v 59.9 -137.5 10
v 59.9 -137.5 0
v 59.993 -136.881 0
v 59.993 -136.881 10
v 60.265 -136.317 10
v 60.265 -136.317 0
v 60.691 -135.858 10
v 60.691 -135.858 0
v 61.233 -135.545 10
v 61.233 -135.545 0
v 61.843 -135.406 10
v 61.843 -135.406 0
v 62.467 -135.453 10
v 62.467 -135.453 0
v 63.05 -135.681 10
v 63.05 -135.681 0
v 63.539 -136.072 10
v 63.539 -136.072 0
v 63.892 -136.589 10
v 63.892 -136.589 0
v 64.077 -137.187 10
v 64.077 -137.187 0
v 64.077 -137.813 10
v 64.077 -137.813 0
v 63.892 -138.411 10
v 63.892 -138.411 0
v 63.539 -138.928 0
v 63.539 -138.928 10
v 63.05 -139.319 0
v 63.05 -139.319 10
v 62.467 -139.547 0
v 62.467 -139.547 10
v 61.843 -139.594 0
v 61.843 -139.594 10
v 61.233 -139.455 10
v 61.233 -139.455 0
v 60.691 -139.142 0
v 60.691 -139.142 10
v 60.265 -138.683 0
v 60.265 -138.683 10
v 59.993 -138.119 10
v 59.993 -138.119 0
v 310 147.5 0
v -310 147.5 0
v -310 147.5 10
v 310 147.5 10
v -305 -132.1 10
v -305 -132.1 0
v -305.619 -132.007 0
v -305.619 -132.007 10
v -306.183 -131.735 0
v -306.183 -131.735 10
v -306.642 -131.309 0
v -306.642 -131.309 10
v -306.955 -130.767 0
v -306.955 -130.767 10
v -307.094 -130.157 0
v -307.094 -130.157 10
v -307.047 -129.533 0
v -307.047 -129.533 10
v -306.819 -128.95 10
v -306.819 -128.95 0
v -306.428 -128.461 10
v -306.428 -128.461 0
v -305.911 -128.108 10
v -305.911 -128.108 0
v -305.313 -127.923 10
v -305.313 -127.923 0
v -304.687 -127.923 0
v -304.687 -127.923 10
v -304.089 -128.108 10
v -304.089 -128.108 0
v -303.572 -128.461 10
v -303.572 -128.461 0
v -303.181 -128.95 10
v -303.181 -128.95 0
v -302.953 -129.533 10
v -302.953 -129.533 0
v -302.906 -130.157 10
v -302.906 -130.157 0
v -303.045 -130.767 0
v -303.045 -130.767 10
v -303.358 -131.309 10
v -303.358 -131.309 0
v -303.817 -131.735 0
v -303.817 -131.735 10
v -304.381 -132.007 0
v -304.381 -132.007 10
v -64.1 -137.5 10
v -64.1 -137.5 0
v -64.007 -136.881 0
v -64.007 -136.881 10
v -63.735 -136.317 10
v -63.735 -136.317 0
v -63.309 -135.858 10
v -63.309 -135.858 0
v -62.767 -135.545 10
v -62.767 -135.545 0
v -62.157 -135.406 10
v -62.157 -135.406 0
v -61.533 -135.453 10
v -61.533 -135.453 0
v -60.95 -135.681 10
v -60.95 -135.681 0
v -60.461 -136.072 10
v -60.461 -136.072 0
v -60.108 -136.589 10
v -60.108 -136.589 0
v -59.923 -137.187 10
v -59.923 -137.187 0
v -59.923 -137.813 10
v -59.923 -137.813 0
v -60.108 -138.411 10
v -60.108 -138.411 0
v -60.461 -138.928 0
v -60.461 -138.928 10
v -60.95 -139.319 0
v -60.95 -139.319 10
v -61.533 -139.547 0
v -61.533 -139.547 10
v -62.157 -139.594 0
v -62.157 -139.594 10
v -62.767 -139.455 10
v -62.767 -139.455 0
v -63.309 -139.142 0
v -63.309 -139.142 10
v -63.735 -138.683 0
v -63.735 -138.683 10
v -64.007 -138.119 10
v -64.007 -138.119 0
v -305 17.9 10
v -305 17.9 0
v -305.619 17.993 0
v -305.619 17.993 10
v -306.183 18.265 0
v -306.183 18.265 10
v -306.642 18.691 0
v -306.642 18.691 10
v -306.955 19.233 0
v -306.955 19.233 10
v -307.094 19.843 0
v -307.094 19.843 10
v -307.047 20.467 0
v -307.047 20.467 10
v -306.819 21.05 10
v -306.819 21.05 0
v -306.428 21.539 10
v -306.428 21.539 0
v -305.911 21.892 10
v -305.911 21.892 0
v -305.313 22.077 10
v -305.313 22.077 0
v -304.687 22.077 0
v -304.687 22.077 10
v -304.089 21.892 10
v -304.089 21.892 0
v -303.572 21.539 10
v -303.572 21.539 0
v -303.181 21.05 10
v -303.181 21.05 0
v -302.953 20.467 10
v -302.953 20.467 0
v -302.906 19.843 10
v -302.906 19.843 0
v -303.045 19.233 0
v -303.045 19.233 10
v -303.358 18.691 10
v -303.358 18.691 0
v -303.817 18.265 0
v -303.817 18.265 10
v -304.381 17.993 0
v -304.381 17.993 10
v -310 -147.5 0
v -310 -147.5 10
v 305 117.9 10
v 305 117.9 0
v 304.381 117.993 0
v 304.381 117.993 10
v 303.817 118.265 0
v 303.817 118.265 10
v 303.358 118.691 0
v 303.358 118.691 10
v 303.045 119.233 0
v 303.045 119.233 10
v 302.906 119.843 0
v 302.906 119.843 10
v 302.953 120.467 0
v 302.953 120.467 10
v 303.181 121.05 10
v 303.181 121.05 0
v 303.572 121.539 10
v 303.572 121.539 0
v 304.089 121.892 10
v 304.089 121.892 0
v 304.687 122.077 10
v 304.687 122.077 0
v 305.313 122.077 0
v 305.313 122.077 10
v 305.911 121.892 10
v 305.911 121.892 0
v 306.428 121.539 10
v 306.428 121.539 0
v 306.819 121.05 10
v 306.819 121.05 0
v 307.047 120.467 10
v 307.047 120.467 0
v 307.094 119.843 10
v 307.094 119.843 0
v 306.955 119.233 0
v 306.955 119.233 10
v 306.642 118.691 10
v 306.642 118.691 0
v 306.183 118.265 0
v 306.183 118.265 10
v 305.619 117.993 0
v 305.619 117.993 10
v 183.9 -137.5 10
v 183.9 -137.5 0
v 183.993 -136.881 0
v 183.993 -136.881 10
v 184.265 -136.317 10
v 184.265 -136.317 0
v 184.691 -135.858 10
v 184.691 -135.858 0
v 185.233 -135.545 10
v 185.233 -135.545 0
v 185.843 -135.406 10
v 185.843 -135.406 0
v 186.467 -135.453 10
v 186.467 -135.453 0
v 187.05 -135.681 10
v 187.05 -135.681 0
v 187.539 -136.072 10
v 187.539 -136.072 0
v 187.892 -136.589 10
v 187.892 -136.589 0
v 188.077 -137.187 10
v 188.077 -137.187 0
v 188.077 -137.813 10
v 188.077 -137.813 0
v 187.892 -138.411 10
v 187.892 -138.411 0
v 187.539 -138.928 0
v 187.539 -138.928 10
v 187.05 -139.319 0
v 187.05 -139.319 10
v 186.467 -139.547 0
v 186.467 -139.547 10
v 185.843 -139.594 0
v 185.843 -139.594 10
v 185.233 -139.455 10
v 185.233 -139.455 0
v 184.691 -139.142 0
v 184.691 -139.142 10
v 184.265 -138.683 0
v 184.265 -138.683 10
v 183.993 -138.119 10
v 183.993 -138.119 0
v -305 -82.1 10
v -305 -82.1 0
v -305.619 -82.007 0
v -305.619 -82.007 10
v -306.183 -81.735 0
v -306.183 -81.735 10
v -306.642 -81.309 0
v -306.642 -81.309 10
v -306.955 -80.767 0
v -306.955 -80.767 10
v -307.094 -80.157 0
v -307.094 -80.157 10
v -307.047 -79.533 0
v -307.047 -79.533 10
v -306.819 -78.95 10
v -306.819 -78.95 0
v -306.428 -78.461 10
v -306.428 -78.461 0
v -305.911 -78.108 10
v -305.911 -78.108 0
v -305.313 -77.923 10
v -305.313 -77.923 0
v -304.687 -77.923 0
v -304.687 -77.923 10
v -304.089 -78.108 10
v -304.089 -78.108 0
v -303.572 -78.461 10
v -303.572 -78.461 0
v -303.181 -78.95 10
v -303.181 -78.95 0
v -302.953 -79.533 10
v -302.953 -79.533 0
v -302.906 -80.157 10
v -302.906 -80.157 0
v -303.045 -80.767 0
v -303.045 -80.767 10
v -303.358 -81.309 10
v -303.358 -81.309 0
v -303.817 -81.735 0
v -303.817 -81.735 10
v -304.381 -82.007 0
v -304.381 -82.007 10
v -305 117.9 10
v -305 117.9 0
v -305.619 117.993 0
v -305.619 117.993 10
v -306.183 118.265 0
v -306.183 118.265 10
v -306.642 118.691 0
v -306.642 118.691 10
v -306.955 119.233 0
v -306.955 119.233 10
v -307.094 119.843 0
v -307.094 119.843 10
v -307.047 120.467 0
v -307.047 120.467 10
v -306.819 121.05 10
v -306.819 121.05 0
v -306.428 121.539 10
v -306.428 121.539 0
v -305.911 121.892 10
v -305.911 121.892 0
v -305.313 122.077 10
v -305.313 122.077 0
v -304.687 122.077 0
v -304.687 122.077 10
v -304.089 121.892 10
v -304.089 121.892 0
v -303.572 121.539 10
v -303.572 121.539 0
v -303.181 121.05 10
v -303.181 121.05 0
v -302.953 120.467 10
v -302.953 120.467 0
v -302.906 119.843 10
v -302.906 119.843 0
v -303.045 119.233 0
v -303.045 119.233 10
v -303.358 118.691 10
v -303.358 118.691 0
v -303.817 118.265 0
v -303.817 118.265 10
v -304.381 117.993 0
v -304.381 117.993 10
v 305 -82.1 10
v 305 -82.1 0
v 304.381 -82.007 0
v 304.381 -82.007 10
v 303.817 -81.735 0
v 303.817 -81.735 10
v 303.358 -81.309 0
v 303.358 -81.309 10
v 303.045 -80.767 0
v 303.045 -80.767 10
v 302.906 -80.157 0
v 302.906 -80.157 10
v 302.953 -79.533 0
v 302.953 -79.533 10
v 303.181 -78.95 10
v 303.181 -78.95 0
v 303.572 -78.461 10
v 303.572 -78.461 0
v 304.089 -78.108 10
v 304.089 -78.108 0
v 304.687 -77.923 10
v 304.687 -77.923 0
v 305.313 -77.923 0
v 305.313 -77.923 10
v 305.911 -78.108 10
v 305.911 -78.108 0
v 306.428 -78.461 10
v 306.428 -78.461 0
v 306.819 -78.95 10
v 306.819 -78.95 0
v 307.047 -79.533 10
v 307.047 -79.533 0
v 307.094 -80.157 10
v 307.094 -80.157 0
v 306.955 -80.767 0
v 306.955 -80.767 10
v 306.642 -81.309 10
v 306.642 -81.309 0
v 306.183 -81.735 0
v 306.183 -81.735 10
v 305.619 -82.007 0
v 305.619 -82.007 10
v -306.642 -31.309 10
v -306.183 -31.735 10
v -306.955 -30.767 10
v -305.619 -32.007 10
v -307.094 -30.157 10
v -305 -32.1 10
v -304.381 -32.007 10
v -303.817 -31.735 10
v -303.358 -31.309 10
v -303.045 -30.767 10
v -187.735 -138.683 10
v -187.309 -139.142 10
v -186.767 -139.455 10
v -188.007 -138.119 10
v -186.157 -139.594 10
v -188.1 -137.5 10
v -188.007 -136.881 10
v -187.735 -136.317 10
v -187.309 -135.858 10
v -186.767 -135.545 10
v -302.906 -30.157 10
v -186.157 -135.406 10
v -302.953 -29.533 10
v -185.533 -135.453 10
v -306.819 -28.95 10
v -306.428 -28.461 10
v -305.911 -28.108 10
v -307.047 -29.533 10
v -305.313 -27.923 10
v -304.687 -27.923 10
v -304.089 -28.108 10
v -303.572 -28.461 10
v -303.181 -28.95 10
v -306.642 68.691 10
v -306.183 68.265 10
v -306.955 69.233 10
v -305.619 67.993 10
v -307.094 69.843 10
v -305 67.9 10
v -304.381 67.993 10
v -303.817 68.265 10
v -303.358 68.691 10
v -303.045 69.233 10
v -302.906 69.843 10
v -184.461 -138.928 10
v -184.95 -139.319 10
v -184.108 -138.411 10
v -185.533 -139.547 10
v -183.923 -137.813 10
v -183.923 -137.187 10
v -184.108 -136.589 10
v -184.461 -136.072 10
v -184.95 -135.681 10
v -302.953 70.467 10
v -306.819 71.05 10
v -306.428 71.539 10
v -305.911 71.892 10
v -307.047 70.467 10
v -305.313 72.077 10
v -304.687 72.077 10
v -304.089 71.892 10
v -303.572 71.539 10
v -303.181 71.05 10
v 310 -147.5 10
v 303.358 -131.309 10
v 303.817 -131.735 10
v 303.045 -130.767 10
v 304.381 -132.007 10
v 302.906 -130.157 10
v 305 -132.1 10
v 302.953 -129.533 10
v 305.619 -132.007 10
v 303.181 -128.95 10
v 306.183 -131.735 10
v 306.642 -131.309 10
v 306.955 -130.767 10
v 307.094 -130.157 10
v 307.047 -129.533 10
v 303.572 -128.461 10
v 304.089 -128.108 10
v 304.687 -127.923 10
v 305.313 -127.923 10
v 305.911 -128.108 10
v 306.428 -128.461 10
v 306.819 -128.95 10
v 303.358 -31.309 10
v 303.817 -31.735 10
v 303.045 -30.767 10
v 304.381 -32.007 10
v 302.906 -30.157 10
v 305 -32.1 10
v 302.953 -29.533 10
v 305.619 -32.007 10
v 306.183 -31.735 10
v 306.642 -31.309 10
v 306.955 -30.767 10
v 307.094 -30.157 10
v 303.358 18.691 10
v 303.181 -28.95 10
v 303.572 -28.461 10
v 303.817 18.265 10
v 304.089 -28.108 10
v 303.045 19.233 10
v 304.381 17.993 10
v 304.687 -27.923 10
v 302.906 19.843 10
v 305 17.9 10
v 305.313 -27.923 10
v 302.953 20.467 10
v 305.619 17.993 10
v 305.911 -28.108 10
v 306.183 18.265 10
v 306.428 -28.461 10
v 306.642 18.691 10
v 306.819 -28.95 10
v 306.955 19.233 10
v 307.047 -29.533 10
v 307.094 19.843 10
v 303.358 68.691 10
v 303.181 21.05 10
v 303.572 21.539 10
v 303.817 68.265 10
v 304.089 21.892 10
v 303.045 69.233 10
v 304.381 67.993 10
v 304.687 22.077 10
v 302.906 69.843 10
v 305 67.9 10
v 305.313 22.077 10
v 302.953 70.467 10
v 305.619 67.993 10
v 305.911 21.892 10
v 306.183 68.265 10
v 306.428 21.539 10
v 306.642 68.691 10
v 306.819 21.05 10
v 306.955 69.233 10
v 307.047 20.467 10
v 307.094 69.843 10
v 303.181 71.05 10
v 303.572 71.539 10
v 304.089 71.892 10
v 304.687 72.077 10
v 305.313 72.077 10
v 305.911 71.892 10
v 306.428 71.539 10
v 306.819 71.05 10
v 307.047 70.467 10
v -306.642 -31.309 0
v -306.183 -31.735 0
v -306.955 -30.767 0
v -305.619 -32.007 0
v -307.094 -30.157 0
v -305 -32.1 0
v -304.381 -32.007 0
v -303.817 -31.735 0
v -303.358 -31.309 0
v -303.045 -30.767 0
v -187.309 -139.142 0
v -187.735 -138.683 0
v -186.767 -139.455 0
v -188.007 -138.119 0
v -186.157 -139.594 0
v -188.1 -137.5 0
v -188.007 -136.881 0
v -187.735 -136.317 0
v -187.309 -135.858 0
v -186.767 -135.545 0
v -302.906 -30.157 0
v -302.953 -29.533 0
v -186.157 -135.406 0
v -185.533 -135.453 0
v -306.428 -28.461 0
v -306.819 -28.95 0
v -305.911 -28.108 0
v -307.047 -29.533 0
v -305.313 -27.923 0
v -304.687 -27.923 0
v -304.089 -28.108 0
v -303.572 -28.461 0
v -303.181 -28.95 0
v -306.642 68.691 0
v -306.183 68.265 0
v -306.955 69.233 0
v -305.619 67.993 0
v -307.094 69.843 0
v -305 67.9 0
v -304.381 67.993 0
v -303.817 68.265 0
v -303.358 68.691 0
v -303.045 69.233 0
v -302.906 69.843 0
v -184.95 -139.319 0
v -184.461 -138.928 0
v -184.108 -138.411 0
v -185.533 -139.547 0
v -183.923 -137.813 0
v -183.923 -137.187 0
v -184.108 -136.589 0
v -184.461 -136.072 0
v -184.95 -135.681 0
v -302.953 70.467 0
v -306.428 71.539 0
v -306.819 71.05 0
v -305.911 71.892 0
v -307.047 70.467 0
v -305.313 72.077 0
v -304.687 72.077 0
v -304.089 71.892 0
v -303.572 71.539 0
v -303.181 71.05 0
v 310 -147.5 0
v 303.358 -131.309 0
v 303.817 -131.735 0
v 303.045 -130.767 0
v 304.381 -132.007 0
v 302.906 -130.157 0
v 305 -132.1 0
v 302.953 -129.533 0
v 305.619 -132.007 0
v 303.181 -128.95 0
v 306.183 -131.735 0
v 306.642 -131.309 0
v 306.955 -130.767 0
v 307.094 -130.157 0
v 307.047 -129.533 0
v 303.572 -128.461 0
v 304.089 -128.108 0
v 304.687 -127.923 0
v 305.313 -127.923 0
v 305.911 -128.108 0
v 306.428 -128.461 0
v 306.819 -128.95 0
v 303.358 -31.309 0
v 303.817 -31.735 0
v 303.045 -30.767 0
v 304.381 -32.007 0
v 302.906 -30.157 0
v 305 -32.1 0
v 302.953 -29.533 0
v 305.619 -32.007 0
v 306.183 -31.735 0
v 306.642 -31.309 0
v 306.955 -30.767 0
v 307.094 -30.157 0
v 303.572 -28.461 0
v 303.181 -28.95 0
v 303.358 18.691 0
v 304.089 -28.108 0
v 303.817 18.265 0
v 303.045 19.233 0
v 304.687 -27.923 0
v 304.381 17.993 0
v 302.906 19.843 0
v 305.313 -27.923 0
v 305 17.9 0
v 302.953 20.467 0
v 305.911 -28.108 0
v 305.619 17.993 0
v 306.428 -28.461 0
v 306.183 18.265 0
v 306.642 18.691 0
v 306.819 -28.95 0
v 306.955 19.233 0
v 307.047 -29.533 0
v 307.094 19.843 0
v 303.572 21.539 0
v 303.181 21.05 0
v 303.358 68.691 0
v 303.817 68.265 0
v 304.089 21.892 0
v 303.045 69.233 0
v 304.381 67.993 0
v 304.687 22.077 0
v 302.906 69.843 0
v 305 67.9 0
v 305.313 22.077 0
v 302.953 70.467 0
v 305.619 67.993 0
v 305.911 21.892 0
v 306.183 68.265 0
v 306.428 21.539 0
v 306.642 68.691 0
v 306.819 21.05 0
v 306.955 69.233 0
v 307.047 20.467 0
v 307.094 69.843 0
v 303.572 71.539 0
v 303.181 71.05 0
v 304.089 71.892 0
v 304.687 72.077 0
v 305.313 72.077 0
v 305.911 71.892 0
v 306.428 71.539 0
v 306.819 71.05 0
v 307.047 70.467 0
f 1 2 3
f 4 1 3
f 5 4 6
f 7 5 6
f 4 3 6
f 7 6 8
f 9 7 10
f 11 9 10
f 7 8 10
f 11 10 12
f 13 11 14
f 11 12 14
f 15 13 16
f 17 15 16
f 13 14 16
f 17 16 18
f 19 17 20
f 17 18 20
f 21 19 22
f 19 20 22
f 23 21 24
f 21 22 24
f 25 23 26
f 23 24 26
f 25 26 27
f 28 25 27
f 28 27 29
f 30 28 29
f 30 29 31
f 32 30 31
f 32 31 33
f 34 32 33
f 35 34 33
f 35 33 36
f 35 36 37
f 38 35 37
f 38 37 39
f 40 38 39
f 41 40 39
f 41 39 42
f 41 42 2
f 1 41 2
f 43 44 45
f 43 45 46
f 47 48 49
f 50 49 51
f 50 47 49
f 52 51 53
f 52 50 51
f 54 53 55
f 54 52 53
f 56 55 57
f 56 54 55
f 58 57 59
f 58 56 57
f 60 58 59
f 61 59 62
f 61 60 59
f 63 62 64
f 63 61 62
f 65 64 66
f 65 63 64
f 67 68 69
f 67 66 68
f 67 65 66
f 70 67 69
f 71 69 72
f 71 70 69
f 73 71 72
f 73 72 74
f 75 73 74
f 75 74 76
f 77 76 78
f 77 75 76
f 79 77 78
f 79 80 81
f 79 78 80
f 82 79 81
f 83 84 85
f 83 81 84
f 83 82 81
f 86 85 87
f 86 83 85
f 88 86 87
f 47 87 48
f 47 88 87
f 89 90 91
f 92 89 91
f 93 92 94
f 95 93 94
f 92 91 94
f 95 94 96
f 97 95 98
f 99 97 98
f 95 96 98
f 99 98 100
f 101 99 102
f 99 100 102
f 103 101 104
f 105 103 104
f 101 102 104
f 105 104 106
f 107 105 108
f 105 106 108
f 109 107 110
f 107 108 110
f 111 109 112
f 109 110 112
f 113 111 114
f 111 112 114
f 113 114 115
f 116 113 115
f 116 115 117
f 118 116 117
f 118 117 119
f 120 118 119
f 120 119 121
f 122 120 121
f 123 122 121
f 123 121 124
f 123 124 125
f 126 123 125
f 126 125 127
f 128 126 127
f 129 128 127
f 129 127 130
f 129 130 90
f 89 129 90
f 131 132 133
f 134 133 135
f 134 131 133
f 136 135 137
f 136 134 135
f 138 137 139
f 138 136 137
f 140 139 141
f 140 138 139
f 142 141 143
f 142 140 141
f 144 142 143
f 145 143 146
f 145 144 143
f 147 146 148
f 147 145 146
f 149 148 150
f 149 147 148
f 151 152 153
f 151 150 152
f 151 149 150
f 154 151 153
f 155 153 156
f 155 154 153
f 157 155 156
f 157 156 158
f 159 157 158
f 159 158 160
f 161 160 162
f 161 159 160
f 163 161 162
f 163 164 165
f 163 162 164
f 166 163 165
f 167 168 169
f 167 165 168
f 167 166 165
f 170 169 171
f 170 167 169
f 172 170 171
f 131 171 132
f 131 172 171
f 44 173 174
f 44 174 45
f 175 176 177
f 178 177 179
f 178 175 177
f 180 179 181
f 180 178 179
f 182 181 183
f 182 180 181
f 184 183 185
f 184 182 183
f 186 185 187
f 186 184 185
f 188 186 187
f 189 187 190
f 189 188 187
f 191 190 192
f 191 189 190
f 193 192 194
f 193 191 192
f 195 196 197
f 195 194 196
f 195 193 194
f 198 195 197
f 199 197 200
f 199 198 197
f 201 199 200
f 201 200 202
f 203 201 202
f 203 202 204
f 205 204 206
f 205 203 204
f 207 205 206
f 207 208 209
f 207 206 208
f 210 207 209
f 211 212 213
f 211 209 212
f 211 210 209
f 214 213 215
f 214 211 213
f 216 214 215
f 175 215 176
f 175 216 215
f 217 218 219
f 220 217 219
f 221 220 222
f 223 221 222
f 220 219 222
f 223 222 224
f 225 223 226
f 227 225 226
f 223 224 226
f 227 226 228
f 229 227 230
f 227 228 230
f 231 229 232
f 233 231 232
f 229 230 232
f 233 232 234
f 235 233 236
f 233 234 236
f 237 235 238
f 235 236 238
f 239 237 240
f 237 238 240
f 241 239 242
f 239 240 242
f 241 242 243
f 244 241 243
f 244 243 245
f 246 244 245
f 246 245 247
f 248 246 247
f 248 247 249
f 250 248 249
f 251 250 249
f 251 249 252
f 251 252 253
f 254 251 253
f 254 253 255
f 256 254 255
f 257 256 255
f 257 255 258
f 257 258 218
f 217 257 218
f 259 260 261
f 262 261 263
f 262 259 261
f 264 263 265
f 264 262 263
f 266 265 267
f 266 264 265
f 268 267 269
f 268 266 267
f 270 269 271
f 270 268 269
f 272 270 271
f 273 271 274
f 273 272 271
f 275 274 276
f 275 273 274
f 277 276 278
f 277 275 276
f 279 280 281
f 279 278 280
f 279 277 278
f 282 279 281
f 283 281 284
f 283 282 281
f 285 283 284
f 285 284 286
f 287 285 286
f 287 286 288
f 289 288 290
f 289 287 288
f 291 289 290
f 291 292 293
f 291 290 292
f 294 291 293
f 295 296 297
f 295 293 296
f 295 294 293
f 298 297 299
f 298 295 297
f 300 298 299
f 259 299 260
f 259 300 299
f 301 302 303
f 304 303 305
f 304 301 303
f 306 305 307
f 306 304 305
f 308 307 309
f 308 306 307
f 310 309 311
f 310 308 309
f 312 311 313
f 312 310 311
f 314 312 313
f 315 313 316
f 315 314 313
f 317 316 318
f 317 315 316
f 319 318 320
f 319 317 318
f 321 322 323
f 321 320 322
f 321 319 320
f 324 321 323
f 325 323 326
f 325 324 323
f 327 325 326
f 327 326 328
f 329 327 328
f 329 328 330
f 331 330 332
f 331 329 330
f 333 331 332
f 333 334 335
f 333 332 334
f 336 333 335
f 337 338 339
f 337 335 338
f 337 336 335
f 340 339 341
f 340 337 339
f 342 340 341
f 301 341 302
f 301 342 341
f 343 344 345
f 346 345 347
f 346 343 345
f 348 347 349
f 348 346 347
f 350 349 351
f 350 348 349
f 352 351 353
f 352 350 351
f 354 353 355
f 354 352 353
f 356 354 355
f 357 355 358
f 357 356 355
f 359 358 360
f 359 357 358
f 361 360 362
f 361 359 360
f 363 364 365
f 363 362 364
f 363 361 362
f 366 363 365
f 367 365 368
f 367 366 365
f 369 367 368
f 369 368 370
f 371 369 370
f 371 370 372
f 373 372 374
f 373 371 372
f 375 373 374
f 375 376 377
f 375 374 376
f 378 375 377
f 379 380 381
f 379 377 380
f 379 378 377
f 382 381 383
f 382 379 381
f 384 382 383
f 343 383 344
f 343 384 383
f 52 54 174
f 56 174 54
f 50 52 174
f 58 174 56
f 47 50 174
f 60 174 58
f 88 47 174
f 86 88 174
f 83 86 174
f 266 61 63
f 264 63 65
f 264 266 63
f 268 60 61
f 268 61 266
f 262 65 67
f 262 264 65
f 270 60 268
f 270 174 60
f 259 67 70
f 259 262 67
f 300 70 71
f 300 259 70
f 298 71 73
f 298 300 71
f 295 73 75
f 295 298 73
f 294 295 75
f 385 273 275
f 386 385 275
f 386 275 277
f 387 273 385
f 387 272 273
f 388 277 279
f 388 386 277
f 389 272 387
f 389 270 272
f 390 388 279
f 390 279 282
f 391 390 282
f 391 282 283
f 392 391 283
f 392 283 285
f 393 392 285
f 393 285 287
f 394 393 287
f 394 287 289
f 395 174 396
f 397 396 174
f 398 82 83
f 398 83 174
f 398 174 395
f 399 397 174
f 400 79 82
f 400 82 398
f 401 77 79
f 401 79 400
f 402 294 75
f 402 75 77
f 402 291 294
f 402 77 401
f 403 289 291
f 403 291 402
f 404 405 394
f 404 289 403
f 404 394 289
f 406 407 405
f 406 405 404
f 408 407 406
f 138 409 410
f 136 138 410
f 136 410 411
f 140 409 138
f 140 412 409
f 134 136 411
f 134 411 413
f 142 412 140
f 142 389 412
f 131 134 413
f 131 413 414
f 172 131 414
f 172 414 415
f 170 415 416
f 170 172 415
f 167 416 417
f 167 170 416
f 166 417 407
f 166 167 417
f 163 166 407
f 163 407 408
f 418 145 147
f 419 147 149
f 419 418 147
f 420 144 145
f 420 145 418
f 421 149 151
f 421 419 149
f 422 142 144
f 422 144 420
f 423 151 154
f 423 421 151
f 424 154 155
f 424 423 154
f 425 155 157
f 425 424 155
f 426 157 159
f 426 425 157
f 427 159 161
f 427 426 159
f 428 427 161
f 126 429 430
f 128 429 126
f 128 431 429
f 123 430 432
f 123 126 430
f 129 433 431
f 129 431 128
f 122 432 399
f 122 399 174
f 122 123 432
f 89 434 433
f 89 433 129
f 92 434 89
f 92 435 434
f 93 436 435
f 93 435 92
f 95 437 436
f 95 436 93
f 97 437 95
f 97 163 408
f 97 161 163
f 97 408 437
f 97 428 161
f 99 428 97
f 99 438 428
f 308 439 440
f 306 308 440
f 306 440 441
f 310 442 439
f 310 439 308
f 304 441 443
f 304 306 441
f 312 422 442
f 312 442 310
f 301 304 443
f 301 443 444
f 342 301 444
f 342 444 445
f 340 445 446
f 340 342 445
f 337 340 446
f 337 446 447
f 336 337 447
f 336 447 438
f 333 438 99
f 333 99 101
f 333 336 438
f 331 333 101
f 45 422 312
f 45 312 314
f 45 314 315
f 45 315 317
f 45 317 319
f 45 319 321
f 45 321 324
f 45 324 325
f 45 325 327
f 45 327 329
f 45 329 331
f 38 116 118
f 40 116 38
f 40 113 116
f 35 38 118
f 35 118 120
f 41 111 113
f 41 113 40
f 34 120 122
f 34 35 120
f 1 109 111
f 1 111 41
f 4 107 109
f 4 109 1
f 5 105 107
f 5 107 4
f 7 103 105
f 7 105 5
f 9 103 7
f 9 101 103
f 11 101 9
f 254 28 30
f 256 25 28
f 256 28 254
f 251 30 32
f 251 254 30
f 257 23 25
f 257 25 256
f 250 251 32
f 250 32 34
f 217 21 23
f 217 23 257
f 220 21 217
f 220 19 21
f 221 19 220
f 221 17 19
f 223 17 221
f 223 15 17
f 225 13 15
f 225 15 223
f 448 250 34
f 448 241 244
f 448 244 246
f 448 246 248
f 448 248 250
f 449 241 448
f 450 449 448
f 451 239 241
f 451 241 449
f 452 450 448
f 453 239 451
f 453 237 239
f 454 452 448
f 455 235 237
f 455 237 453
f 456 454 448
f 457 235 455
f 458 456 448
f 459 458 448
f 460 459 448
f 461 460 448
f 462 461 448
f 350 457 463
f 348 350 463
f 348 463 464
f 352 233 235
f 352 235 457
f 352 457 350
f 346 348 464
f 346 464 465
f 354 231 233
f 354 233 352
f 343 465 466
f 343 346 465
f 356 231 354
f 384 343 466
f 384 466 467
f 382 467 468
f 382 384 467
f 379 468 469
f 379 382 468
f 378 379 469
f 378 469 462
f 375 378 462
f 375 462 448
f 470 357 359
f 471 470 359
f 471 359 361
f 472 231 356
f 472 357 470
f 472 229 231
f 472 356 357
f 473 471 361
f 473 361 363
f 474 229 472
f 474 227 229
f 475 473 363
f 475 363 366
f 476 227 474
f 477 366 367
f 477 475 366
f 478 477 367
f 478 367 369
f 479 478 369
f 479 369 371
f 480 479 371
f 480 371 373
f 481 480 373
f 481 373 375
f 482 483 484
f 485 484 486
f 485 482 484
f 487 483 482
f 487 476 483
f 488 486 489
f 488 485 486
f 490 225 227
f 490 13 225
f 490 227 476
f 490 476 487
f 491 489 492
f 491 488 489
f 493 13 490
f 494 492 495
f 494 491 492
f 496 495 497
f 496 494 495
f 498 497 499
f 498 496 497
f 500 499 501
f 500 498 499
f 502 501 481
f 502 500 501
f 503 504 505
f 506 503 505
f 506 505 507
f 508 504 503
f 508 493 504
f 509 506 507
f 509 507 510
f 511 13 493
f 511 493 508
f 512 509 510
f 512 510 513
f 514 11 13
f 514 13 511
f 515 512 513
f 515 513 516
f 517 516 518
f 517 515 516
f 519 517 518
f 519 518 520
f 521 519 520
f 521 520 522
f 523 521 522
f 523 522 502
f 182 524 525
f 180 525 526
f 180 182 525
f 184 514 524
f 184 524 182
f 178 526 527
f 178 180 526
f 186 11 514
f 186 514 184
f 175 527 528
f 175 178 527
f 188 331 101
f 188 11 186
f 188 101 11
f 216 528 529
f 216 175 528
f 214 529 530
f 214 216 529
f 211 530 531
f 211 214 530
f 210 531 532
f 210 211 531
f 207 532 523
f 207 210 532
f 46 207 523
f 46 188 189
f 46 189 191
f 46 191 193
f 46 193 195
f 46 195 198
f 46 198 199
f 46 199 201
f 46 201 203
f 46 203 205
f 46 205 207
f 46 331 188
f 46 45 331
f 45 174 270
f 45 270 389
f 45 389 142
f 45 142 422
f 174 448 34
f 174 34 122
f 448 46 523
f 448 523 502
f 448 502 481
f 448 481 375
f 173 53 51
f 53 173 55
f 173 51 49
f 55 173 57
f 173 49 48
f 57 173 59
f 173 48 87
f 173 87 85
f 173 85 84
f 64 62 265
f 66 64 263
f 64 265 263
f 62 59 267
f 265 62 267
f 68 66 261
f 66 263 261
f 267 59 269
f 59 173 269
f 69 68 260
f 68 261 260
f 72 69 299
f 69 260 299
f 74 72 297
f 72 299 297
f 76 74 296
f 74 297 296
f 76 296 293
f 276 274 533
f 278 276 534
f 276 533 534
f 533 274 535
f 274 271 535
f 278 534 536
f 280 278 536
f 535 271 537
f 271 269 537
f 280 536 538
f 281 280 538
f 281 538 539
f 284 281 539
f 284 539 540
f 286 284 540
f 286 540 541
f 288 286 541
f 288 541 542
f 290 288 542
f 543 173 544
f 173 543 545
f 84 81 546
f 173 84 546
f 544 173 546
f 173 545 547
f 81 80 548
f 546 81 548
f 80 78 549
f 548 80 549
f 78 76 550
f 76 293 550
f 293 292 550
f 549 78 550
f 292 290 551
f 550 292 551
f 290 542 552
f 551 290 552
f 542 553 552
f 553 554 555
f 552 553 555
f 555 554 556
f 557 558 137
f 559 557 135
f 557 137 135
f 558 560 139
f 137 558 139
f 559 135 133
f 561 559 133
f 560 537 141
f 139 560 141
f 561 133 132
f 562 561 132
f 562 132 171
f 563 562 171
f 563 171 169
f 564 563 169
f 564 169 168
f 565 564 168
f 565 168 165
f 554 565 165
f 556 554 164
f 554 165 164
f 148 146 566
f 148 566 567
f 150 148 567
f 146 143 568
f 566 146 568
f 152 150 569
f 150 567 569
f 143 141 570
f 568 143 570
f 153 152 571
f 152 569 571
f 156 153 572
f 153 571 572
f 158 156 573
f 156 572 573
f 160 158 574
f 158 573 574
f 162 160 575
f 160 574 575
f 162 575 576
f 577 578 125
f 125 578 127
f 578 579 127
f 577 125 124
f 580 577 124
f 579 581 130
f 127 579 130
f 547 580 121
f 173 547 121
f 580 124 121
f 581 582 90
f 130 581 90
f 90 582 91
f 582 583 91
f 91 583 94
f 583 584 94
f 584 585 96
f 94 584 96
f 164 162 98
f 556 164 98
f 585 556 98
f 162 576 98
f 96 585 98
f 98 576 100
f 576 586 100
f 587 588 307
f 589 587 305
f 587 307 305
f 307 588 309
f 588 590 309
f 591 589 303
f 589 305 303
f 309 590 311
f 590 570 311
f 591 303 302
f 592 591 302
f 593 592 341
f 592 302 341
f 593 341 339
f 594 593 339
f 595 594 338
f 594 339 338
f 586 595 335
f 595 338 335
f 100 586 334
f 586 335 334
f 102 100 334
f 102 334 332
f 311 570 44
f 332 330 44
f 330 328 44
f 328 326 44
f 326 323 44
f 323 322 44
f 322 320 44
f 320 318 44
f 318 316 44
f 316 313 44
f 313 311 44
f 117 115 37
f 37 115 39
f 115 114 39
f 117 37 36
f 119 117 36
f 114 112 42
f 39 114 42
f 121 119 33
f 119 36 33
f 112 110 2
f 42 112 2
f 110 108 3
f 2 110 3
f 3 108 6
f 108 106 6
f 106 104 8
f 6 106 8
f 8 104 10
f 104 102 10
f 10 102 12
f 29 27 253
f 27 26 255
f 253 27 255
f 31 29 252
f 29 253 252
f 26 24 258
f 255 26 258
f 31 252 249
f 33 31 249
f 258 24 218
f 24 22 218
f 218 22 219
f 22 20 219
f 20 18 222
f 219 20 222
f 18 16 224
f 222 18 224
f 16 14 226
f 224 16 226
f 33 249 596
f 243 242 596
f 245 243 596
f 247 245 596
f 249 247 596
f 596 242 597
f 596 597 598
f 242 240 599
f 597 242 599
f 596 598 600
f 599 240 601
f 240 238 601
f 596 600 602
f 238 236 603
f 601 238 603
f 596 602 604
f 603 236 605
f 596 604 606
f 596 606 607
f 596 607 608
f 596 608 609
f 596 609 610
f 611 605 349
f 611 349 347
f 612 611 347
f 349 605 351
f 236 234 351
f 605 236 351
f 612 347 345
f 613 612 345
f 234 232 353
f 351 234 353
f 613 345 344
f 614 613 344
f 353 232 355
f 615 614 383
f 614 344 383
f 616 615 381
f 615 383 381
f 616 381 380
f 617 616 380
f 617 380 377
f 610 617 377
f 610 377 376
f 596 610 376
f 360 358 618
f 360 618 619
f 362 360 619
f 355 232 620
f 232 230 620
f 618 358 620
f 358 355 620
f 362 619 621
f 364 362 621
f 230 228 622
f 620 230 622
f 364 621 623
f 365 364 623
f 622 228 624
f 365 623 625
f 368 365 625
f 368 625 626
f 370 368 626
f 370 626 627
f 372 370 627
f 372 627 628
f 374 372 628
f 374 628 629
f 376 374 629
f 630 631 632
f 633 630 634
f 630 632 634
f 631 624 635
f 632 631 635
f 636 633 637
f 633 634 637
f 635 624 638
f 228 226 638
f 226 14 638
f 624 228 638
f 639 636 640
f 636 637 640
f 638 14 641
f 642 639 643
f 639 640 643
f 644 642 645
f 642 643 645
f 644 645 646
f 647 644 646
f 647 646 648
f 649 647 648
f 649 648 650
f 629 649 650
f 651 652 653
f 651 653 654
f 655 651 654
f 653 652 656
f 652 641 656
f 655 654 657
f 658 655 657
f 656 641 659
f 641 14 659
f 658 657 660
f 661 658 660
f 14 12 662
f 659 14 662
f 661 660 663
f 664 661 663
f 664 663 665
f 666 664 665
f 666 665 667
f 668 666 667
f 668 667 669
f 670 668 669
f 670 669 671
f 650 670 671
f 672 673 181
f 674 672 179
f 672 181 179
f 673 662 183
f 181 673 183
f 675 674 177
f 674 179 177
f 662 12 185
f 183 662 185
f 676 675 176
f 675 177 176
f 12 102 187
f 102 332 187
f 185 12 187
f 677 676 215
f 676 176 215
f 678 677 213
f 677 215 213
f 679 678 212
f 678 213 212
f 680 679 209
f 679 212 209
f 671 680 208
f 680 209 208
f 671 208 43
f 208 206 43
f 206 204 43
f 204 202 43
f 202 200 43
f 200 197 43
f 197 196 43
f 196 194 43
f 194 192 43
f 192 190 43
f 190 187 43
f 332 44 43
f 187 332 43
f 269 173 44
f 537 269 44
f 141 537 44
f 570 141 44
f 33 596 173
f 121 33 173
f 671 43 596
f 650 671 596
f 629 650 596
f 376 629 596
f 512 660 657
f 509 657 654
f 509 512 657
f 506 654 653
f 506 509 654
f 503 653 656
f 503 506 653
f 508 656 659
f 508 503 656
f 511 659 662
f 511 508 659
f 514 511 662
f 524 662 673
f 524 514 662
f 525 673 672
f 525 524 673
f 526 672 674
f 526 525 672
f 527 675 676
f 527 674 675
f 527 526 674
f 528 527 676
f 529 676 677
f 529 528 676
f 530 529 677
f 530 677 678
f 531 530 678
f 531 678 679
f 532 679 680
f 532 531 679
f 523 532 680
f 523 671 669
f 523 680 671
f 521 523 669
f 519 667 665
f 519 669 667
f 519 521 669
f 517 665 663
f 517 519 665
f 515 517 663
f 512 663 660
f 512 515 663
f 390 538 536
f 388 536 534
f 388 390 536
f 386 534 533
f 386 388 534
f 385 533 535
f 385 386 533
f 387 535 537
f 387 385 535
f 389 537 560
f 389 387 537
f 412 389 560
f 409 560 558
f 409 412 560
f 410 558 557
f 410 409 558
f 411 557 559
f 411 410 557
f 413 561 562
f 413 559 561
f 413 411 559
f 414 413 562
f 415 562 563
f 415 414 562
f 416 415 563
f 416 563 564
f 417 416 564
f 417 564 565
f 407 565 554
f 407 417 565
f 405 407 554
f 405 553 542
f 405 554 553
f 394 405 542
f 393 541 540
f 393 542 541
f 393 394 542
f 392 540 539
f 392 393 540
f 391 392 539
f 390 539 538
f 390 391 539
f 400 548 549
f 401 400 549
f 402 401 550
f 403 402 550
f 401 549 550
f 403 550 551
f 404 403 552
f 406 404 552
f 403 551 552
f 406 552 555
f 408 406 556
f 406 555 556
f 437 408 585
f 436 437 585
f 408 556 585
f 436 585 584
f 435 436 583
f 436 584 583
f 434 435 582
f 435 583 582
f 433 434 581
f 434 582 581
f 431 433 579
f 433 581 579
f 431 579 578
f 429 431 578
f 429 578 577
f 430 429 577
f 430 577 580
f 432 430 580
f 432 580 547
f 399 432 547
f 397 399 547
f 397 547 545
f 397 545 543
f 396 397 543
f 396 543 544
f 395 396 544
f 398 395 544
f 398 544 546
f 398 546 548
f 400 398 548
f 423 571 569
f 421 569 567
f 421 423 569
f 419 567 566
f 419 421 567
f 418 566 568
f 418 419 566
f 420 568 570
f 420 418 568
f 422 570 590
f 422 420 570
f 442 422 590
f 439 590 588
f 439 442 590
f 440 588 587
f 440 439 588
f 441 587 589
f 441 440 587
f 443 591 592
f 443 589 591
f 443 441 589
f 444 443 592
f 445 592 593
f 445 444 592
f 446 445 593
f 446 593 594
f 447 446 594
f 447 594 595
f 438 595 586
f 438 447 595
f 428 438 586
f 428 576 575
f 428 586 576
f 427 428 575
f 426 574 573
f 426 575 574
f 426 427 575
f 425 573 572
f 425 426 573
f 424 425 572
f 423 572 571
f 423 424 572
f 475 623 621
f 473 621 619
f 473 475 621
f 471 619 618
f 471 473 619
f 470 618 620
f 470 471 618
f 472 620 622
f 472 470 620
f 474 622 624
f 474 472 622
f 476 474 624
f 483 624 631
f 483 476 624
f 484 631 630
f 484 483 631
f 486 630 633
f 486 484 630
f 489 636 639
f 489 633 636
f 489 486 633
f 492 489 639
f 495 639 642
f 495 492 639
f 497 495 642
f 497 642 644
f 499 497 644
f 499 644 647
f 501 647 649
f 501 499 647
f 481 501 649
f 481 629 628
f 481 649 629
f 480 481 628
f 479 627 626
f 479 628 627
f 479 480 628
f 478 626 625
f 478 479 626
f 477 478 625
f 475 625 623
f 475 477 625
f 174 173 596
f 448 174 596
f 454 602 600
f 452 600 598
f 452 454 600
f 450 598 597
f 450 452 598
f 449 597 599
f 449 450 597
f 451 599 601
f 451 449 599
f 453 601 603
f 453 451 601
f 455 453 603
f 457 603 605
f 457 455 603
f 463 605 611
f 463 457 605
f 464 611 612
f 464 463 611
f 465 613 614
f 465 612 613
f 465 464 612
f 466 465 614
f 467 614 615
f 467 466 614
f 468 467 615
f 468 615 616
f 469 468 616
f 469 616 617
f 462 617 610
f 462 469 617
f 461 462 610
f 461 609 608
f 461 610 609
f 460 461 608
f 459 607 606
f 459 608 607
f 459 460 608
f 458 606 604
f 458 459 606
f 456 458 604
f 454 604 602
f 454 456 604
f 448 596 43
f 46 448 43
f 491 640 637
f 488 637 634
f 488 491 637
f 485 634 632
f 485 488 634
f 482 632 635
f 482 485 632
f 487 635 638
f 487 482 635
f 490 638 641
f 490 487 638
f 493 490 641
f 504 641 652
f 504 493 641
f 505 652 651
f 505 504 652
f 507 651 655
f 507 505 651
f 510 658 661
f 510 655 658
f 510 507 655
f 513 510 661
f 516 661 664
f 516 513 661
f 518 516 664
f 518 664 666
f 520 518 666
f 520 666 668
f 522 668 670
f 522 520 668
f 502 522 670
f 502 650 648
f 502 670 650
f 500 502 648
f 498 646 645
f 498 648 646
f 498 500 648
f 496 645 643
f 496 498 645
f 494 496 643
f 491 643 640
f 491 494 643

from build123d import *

# Parameters (mm, degrees)
SKETCH_1_W                  = 620
SKETCH_1_H                  = 295
EXTRUDE_1_DEPTH             = 10
HOLE_WIZARD_M5_1_AT_2_COUNT = 2
HOLE_WIZARD_M5_1_AT_2_PITCH = 610
PATTERN_LINEAR_1_COUNT      = 6
PATTERN_LINEAR_1_PITCH      = 50
HOLE_WIZARD_M5_2_D          = 4.2


with BuildPart() as part:
    # 草图1 → 凸台-拉伸1 (new body)
    with BuildSketch(Plane.XY):
        Rectangle(SKETCH_1_W, SKETCH_1_H)
    extrude(amount=EXTRUDE_1_DEPTH)

    # 草图4 → M5 螺纹孔1 (revolve, cut)
    with BuildSketch(Plane(origin=(-305, 120, 10), x_dir=(0, -1, 0), z_dir=(1, 0, 0))):
        Polygon((0, 0), (0, 13.4618073), (2.1, 12.2), (2.1, 0), align=None)
    hole_wizard_m5_1 = revolve(axis=Axis((-305, 120, 16.35), (0, 0, -1)), mode=Mode.SUBTRACT)

    # M5 螺纹孔1 at 2: M5 螺纹孔1 ×2
    with Locations(*[(i * HOLE_WIZARD_M5_1_AT_2_PITCH, 0, 0) for i in range(1, HOLE_WIZARD_M5_1_AT_2_COUNT)]):
        add(hole_wizard_m5_1, mode=Mode.SUBTRACT)

    # 阵列(线性)1: M5 螺纹孔1 ×6
    with Locations(*[(0, -i * PATTERN_LINEAR_1_PITCH, 0) for i in range(1, PATTERN_LINEAR_1_COUNT)]):
        add(hole_wizard_m5_1, mode=Mode.SUBTRACT)

    # 阵列(线性)1 copy 1 sketch → 阵列(线性)1 copy 1 (revolve, cut)
    with BuildSketch(Plane(origin=(305, 70, 10), x_dir=(0, -1, 0), z_dir=(1, 0, 0))):
        Polygon((0, 0), (0, 13.4618073), (2.1, 12.2), (2.1, 0), align=None)
    revolve(axis=Axis((305, 70, 16.35), (0, 0, -1)), mode=Mode.SUBTRACT)

    # 阵列(线性)1 copy 2 sketch → 阵列(线性)1 copy 2 (revolve, cut)
    with BuildSketch(Plane(origin=(305, 20, 10), x_dir=(0, -1, 0), z_dir=(1, 0, 0))):
        Polygon((0, 0), (0, 13.4618073), (2.1, 12.2), (2.1, 0), align=None)
    revolve(axis=Axis((305, 20, 16.35), (0, 0, -1)), mode=Mode.SUBTRACT)

    # 阵列(线性)1 copy 3 sketch → 阵列(线性)1 copy 3 (revolve, cut)
    with BuildSketch(Plane(origin=(305, -30, 10), x_dir=(0, -1, 0), z_dir=(1, 0, 0))):
        Polygon((0, 0), (0, 13.4618073), (2.1, 12.2), (2.1, 0), align=None)
    revolve(axis=Axis((305, -30, 16.35), (0, 0, -1)), mode=Mode.SUBTRACT)

    # 阵列(线性)1 copy 4 sketch → 阵列(线性)1 copy 4 (revolve, cut)
    with BuildSketch(Plane(origin=(305, -80, 10), x_dir=(0, -1, 0), z_dir=(1, 0, 0))):
        Polygon((0, 0), (0, 13.4618073), (2.1, 12.2), (2.1, 0), align=None)
    revolve(axis=Axis((305, -80, 16.35), (0, 0, -1)), mode=Mode.SUBTRACT)

    # 阵列(线性)1 copy 5 sketch → 阵列(线性)1 copy 5 (revolve, cut)
    with BuildSketch(Plane(origin=(305, -130, 10), x_dir=(0, -1, 0), z_dir=(1, 0, 0))):
        Polygon((0, 0), (0, 13.4618073), (2.1, 12.2), (2.1, 0), align=None)
    revolve(axis=Axis((305, -130, 16.35), (0, 0, -1)), mode=Mode.SUBTRACT)

    # M5 螺纹孔2 (through all)
    with Locations(Plane.XY.offset(10)):
        with Locations((-186, -137.5), (-62, -137.5), (62, -137.5), (186, -137.5)):
            Hole(HOLE_WIZARD_M5_2_D / 2)


solid = part.part
